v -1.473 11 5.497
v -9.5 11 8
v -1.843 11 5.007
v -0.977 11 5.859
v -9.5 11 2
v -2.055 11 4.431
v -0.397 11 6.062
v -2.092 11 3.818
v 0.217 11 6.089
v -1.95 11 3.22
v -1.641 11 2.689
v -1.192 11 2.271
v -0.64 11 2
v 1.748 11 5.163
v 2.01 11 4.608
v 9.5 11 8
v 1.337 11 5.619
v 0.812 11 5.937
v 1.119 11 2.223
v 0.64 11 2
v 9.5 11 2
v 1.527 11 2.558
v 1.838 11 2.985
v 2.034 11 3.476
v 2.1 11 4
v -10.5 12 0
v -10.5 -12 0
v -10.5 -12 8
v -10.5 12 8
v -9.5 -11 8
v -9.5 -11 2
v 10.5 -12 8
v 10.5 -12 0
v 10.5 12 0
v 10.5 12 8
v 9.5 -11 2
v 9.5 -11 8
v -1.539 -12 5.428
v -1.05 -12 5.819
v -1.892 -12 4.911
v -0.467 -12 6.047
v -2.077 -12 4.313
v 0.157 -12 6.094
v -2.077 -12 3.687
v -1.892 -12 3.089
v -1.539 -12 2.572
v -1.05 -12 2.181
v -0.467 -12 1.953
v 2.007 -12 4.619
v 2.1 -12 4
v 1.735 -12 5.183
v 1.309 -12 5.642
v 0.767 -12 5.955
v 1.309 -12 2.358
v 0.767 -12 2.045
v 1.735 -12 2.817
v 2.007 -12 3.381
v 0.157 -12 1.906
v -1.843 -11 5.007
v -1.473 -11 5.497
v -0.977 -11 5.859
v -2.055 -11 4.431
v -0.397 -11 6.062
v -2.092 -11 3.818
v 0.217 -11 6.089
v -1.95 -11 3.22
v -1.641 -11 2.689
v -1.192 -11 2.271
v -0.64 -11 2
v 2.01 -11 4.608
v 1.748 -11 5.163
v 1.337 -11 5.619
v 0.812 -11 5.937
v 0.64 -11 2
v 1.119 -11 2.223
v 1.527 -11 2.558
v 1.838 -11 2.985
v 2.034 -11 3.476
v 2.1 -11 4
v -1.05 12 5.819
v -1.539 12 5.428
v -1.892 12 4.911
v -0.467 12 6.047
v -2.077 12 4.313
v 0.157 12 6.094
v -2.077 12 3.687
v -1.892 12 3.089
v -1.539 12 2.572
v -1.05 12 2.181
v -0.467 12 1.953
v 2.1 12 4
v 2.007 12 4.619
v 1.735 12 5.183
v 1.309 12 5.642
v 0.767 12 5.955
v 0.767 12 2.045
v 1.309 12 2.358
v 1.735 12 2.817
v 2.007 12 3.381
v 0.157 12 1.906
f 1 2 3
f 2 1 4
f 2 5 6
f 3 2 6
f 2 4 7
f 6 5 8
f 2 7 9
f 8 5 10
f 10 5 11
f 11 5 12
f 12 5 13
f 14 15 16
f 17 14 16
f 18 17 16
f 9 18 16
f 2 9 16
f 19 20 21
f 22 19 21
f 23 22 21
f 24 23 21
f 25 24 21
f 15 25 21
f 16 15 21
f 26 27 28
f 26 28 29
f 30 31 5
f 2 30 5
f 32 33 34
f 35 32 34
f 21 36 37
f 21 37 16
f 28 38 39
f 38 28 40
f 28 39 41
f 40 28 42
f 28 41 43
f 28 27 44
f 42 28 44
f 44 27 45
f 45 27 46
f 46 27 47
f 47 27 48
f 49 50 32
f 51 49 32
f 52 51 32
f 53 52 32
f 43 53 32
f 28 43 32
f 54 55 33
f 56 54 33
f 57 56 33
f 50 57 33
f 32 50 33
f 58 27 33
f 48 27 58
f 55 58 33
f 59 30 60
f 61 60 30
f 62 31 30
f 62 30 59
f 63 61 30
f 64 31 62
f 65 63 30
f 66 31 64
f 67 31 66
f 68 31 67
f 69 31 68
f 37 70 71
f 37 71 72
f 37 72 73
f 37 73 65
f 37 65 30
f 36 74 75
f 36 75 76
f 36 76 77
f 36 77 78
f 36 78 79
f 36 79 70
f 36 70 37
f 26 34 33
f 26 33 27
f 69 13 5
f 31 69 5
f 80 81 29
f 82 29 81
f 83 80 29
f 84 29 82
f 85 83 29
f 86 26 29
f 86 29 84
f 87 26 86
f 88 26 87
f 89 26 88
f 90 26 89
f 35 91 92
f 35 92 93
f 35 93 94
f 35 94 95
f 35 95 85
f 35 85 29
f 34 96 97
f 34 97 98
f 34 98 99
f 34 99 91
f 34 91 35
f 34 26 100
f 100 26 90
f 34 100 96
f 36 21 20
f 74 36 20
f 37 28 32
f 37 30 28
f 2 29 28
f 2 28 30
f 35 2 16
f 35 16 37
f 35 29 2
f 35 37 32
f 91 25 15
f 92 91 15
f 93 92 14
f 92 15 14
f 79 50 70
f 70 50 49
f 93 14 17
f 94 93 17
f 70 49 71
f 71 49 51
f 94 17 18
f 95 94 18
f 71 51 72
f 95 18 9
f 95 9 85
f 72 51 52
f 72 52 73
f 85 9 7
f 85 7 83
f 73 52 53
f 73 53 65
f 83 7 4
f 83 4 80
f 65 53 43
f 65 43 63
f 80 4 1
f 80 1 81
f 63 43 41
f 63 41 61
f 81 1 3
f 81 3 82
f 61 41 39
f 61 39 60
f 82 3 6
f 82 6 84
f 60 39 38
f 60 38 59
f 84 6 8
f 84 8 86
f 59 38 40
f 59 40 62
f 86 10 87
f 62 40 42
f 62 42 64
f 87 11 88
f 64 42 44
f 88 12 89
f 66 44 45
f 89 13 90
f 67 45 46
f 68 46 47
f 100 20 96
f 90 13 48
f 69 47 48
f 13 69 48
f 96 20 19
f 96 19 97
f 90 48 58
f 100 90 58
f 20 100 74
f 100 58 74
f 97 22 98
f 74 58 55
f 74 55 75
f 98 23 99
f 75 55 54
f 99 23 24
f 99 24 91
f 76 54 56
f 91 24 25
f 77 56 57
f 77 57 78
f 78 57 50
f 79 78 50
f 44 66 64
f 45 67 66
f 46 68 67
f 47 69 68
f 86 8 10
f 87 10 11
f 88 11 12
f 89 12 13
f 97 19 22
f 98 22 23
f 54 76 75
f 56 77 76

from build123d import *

# Parameters (mm, degrees)
SKETCH1_W           = 21
SKETCH1_H           = 24
SKETCH1_W_2         = 19
SKETCH1_H_2         = 22
BOSS_EXTRUDE1_DEPTH = 8
SKETCH2_W           = 19
SKETCH2_H           = 22
BOSS_EXTRUDE2_DEPTH = 2
SKETCH3_R           = 2.1
CUT_EXTRUDE1_DEPTH  = 30


with BuildPart() as part:
    # Sketch1 → Boss-Extrude1 (new body)
    with BuildSketch(Plane.XY):
        Rectangle(SKETCH1_W, SKETCH1_H)
        Rectangle(SKETCH1_W_2, SKETCH1_H_2, mode=Mode.SUBTRACT)
    extrude(amount=BOSS_EXTRUDE1_DEPTH)

    # Sketch2 → Boss-Extrude2 (add)
    with BuildSketch(Plane(origin=(0, 0, 0), x_dir=(-1, 0, 0), z_dir=(0, 0, -1))):
        Rectangle(SKETCH2_W, SKETCH2_H)
    extrude(amount=-BOSS_EXTRUDE2_DEPTH)

    # Sketch3 → Cut-Extrude1 (cut)
    with BuildSketch(Plane.XZ.offset(12)):
        with Locations((0, 4)):
            Circle(SKETCH3_R)
    extrude(amount=-CUT_EXTRUDE1_DEPTH, mode=Mode.SUBTRACT)


solid = part.part
